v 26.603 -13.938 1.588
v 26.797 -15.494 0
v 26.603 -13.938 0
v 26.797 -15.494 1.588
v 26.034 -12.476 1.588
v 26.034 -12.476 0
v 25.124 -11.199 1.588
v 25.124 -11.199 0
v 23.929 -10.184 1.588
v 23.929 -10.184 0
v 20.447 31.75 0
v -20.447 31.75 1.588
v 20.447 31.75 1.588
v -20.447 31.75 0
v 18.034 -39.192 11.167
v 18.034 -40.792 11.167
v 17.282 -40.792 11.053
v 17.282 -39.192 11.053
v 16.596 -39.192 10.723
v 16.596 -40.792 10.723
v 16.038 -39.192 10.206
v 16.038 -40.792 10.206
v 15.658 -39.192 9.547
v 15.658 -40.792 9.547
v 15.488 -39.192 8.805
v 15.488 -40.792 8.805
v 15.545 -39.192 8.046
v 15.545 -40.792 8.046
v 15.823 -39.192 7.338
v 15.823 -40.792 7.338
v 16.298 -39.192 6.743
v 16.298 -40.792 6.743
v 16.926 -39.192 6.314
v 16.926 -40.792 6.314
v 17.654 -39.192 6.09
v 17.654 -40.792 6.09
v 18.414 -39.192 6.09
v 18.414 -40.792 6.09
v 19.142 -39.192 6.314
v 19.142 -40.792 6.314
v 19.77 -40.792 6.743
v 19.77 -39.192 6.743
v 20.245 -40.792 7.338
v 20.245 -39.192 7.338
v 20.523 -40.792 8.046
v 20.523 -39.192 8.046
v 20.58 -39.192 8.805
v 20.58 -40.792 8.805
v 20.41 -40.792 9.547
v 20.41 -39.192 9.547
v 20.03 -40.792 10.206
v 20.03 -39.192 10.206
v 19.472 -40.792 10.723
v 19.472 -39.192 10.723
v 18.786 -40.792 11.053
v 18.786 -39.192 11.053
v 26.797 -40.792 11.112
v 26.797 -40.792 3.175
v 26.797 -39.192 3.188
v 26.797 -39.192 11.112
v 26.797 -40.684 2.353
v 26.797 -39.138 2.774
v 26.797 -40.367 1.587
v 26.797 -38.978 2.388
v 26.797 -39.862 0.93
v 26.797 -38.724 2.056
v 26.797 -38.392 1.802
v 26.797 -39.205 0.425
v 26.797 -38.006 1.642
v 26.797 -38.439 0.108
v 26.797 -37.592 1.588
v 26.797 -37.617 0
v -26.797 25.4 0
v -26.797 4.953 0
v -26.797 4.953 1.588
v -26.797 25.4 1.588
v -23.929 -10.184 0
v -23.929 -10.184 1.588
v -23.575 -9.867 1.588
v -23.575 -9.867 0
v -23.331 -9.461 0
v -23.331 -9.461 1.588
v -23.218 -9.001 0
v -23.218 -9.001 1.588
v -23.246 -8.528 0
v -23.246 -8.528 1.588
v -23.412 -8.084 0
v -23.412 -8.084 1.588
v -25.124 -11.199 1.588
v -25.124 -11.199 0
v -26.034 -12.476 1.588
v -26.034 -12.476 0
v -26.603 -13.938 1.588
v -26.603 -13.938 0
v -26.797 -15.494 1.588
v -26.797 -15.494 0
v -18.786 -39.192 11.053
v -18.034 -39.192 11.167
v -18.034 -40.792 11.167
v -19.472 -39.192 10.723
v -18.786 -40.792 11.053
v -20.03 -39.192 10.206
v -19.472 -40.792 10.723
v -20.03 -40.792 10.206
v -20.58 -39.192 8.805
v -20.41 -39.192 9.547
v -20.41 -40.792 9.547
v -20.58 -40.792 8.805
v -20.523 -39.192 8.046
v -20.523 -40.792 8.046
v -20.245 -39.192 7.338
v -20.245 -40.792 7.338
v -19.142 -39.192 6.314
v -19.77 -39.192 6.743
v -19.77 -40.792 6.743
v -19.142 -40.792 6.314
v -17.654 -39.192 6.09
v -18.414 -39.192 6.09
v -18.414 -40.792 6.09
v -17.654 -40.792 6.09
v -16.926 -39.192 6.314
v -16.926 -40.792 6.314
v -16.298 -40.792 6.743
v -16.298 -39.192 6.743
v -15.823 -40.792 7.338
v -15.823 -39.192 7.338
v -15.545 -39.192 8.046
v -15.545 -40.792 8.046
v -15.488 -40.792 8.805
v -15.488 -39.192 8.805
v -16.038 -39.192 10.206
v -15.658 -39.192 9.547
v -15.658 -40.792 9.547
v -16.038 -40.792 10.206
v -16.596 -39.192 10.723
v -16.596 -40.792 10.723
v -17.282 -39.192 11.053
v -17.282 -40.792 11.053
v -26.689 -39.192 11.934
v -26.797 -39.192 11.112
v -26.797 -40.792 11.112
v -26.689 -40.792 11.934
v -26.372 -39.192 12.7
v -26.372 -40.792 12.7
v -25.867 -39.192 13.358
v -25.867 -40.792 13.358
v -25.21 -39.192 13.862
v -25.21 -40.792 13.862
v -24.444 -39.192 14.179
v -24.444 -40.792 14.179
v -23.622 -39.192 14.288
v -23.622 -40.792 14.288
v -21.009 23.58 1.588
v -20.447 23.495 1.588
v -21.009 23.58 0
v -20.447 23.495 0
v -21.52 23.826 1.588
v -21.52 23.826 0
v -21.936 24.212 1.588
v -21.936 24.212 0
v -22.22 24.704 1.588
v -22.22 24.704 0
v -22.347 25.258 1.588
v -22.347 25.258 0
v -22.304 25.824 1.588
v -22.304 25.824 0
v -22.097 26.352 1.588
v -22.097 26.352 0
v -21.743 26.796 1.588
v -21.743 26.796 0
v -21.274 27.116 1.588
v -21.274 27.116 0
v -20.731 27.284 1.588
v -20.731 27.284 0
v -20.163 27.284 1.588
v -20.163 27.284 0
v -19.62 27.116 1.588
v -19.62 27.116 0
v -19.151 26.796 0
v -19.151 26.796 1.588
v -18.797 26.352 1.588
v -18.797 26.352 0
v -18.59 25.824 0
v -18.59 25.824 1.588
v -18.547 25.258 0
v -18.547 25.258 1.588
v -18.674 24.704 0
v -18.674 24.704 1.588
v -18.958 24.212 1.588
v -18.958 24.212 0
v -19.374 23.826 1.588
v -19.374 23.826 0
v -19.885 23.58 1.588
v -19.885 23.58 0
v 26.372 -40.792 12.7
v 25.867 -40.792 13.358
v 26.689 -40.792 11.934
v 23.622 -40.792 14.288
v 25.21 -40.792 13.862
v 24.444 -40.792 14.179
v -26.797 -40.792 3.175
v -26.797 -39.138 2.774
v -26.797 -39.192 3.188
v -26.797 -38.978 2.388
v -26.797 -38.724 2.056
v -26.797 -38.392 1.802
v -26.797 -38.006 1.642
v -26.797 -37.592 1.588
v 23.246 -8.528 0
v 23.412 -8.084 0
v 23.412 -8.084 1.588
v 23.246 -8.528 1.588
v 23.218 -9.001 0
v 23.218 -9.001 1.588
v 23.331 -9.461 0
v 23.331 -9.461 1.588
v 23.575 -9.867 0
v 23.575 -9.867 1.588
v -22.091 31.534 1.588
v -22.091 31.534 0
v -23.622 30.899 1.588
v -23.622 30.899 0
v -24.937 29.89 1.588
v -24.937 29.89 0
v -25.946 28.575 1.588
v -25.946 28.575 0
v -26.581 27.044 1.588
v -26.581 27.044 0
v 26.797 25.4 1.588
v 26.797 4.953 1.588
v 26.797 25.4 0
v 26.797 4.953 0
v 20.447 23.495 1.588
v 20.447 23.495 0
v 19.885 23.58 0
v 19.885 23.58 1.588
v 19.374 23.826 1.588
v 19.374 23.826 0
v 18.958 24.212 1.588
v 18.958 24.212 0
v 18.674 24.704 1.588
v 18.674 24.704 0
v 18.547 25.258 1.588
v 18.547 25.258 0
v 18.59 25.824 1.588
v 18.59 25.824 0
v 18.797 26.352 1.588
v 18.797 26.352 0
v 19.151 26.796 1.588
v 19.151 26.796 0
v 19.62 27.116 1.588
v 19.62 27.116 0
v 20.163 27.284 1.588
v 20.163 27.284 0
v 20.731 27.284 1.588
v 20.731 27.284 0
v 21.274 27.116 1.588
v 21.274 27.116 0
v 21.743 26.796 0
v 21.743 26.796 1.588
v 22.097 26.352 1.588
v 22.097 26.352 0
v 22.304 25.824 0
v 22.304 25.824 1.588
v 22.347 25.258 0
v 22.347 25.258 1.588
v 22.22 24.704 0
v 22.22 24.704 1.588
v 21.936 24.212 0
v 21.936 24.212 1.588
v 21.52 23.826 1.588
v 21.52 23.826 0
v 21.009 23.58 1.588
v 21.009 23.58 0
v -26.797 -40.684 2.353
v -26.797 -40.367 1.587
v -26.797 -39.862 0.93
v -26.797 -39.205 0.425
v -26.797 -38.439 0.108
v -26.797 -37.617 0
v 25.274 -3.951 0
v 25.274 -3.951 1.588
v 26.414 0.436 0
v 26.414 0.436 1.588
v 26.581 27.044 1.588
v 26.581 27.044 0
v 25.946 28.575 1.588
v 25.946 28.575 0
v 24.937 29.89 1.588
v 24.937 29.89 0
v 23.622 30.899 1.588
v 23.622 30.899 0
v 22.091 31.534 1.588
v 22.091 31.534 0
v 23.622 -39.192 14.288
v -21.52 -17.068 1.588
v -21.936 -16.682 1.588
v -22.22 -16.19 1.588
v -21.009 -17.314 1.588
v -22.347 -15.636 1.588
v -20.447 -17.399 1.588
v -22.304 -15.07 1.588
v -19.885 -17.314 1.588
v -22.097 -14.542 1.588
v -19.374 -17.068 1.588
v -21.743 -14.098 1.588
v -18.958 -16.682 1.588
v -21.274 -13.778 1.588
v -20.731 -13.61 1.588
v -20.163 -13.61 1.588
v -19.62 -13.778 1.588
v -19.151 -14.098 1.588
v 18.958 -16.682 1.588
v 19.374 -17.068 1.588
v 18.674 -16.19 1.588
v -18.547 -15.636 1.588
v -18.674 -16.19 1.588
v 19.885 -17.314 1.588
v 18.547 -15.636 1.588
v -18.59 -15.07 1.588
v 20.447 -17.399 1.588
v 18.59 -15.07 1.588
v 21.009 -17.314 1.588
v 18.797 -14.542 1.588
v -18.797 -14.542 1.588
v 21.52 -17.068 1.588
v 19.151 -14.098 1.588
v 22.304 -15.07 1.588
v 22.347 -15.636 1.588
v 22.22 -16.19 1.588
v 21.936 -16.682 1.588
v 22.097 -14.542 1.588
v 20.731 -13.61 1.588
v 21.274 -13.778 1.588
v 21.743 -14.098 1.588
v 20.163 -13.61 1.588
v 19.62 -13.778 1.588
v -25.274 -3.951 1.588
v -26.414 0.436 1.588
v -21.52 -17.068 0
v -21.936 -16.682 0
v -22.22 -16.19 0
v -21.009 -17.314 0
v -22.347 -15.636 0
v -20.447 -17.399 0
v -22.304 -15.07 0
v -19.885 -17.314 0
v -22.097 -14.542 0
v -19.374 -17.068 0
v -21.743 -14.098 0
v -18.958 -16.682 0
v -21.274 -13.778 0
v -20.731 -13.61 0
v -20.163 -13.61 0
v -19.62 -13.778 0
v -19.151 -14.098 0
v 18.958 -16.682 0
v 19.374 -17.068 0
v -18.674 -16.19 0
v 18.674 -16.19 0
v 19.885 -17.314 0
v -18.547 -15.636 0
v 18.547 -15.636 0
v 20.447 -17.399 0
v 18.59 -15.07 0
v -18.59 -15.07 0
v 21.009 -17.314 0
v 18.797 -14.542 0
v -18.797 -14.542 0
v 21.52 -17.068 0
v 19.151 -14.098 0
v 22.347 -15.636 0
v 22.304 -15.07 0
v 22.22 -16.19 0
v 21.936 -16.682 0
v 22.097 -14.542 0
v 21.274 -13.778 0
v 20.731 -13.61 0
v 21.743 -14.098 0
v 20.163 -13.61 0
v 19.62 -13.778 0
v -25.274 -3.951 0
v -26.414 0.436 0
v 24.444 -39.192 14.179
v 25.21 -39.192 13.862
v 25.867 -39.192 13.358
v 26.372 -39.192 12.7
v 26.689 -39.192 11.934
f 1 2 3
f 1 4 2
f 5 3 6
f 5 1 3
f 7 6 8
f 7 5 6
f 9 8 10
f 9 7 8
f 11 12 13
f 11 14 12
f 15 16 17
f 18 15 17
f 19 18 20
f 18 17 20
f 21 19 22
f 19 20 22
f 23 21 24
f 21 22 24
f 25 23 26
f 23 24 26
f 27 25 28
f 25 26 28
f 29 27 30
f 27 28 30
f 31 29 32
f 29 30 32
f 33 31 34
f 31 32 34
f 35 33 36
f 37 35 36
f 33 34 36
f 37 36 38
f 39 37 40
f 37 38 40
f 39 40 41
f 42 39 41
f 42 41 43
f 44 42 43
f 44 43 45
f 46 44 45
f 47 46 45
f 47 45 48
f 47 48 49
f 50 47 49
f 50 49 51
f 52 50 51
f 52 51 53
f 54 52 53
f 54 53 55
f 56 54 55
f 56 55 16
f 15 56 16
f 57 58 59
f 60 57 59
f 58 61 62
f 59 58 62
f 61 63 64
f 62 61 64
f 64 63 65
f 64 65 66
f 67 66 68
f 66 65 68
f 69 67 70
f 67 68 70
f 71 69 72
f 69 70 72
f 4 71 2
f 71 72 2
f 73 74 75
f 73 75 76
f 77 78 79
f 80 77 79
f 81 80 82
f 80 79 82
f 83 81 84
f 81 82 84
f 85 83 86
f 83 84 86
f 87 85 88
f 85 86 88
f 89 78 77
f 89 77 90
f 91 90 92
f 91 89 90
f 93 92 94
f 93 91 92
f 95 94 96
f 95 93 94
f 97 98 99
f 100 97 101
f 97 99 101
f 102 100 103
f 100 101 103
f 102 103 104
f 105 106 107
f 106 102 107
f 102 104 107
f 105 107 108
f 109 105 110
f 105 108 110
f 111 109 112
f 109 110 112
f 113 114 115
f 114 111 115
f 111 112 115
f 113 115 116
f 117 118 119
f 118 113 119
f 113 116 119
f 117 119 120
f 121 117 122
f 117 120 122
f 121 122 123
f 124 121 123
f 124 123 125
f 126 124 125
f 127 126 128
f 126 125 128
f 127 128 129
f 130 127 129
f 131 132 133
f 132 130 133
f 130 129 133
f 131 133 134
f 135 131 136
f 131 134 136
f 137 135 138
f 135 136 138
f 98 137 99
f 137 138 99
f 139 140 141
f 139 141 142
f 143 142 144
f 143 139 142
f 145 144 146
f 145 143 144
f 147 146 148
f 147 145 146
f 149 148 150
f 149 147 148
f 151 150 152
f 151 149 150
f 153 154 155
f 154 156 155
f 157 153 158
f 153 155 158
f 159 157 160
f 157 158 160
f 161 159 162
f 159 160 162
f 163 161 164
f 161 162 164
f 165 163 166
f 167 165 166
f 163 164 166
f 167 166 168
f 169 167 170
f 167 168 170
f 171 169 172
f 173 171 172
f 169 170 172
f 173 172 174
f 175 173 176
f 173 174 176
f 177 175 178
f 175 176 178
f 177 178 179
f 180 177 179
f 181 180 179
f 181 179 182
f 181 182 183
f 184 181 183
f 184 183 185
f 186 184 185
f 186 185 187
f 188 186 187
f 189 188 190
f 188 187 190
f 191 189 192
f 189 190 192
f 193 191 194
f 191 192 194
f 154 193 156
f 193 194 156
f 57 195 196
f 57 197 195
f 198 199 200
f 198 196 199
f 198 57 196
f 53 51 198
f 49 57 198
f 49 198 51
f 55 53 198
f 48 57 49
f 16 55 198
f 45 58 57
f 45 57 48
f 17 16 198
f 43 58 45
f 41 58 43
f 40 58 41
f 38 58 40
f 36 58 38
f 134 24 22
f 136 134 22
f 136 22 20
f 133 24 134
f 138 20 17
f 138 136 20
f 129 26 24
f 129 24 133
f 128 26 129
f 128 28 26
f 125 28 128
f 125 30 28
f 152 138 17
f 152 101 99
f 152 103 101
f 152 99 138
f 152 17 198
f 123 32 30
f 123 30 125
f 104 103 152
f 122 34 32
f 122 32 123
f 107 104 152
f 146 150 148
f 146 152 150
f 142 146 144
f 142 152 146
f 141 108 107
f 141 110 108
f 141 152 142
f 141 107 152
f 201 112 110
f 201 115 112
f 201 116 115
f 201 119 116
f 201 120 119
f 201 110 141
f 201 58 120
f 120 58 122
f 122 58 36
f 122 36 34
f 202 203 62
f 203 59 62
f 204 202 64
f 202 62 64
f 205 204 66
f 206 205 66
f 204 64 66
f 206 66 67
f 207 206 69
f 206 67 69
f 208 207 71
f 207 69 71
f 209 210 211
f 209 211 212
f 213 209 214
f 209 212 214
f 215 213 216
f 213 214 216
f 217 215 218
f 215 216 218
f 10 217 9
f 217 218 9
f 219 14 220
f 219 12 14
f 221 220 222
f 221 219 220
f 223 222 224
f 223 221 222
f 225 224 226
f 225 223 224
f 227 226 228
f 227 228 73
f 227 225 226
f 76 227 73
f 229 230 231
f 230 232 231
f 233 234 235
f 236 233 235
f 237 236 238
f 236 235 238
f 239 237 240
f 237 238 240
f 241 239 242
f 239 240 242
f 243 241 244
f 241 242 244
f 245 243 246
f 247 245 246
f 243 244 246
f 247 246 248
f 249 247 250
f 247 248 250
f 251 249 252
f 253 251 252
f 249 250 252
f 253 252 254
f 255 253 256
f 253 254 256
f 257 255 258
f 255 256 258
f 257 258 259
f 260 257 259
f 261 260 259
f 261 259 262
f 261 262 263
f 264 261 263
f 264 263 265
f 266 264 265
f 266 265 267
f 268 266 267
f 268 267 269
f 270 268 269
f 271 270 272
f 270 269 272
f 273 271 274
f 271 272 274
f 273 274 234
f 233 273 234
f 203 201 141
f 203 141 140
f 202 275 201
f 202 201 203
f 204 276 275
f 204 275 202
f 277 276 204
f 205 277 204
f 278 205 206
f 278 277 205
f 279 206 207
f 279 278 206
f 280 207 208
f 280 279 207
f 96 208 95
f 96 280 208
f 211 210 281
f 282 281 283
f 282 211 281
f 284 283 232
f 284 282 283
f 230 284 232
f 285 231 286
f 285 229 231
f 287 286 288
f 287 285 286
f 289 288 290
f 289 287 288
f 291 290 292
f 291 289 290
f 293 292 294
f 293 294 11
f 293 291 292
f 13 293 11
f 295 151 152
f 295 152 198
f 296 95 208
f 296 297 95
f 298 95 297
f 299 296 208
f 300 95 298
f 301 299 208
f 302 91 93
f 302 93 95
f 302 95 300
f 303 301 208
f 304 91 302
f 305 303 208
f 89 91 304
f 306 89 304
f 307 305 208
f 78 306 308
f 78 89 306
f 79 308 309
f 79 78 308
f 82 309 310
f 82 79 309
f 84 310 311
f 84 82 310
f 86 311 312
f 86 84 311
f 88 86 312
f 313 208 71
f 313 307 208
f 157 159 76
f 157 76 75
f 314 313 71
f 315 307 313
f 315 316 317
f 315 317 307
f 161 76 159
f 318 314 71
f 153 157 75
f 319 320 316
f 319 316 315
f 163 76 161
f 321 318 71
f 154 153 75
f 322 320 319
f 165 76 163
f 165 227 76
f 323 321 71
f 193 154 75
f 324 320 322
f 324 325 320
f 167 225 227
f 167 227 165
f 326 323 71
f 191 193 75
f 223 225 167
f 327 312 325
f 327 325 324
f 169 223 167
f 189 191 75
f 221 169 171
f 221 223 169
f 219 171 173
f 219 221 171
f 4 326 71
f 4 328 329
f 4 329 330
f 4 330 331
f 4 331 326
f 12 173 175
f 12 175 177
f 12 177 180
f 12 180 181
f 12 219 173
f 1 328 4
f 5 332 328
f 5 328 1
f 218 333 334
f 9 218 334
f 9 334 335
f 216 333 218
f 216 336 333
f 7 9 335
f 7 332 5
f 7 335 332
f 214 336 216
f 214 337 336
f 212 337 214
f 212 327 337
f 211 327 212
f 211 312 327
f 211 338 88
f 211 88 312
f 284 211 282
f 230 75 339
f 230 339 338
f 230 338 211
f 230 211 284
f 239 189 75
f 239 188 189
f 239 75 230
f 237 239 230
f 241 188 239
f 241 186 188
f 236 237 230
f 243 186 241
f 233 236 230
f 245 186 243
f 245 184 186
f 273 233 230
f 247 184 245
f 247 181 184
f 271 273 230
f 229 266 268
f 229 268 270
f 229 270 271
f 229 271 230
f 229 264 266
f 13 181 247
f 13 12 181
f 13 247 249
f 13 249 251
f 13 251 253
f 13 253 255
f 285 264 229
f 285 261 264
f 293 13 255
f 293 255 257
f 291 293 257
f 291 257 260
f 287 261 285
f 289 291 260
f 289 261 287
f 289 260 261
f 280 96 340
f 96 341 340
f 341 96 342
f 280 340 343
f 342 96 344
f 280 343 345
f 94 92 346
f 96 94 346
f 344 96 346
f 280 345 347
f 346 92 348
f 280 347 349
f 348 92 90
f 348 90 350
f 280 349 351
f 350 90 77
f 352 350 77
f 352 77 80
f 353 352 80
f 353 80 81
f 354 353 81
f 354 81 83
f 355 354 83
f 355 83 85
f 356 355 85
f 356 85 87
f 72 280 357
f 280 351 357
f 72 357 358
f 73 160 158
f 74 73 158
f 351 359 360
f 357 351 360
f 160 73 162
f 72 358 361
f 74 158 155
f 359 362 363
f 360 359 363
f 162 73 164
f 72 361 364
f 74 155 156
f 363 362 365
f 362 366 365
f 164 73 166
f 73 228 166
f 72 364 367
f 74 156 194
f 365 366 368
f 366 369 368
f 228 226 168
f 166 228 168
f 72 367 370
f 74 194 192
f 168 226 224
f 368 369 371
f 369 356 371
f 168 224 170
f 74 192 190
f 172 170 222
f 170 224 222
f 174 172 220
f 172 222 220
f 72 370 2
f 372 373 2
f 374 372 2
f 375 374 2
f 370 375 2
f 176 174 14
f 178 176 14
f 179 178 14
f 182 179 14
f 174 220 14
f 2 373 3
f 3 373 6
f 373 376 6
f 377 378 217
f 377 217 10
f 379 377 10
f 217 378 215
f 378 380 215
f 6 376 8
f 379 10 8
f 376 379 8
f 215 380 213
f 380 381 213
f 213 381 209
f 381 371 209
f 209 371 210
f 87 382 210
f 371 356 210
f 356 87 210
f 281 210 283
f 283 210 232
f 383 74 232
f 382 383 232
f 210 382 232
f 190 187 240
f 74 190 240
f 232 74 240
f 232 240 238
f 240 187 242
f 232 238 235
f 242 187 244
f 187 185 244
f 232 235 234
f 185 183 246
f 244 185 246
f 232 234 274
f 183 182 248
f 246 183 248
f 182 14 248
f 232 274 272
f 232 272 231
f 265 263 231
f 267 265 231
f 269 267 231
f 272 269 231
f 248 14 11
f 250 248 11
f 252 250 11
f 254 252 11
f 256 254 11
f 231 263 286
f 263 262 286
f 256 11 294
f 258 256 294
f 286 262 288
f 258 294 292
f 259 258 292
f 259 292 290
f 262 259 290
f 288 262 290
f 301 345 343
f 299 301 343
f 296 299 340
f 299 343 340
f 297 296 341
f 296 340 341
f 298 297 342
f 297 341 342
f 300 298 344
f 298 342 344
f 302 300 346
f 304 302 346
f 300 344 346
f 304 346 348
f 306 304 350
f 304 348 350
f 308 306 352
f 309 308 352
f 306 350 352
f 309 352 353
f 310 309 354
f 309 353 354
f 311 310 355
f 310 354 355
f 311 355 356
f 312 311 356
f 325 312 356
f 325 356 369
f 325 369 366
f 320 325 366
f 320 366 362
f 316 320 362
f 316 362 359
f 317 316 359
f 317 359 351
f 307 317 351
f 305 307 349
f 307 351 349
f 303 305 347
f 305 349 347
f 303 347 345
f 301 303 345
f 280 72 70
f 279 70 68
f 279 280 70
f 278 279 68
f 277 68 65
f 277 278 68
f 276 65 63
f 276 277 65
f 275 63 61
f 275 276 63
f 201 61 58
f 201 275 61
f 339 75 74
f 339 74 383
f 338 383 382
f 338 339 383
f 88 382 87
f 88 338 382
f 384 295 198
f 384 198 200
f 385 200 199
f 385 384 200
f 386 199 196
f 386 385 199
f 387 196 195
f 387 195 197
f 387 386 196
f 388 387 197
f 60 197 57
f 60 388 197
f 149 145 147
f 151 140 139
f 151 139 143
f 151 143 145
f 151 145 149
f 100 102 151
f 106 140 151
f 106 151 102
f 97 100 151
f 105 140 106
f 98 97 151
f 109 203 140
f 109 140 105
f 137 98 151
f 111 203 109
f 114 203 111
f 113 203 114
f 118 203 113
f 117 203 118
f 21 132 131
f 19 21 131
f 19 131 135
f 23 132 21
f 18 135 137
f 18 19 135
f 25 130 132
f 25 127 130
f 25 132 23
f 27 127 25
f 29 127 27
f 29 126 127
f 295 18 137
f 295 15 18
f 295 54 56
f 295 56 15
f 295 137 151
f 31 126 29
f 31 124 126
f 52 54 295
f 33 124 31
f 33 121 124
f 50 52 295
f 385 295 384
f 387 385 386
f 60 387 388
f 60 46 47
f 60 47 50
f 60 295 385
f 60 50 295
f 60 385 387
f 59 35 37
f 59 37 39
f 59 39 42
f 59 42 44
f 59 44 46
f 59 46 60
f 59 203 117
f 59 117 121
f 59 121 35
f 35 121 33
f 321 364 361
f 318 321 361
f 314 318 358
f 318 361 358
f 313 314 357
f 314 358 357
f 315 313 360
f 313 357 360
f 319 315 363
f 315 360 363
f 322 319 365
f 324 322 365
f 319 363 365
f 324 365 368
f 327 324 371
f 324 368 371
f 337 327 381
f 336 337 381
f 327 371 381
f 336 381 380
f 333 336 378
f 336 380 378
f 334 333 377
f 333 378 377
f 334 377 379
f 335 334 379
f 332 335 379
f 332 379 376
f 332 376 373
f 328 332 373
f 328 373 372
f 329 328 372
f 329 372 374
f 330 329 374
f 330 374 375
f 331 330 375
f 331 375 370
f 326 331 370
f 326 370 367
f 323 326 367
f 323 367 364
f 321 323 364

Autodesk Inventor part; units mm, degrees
ref_plane "XZ Plane" through (0, 0, 0) normal (0, 1, 0) x (-1, 0, 0)
ref_plane "XY Plane" through (0, 0, 0) normal (0, 0, 1) x (1, 0, 0)
sketch "Sketch1" plane through (0, 0, 0) normal (0, 0, 1) x (1, 0, 0)
  line L0 (-26.797, 31.75) -> (26.797, 31.75)
  line L1 (26.797, 31.75) -> (26.797, -31.75)
  line L2 (26.797, -31.75) -> (-26.797, -31.75)
  line L3 (-26.797, -31.75) -> (-26.797, 31.75)
  point P0 (0, 0)
  point P1 (-26.797, 0)
  point P2 (0, 31.75)
  dimension "d0" = 53.594
  dimension "d1" = 63.5
extrude "Extrusion1" add sketch "Sketch1" along normal blind 1.5875
sketch "Sketch9" plane through (0, 0, 1.5875) normal (0, 0, 1) x (1, 0, 0)
  line L0 (26.797, 31.75) -> (26.797, -31.75) projected
  line L1 (-26.797, -31.75) -> (-26.797, 31.75) projected
  line L2 (26.797, -31.75) -> (-26.797, -31.75) projected
  line L3 (-26.797, -31.75) -> (26.797, -31.75)
  line L4 (26.797, -31.75) -> (26.797, -40.7924)
  line L5 (26.797, -40.7924) -> (-26.797, -40.7924)
  line L6 (-26.797, -40.7924) -> (-26.797, -31.75)
  line L7 (-26.797, 31.75) -> (26.797, 31.75) projected
  point P0 (0, 0)
  dimension "d60" = 72.5424
extrude "Extrusion5" add sketch "Sketch9" against normal up to surface (1.5875 mm away) contours L4 L5 L6 L2
sketch "Sketch2" plane through (0, 0, 1.5875) normal (0, 0, 1) x (1, 0, 0)
  line L0 (-26.797, -39.1922) -> (26.797, -39.1922)
  line L1 (26.797, -40.7924) -> (-26.797, -40.7924)
  line L2 (26.797, -40.7924) -> (26.797, 31.75) projected
  line L3 (-26.797, -40.7924) -> (26.797, -40.7924) projected
  line L4 (-26.797, -40.7924) -> (-26.797, -39.1922)
  line L5 (26.797, -40.7924) -> (26.797, -39.1922)
  point P0 (-26.797, -31.75)
  point P1 (0, 0)
  dimension "d4" = 53.594
  dimension "d59" = 1.6002
extrude "Extrusion2" add sketch "Sketch2" along normal blind 12.7
sketch "Sketch6" plane through (0, 0, 1.5875) normal (0, 0, 1) x (1, 0, 0)
  line L0 (26.797, 31.75) -> (26.797, -29.3687) projected
  line L1 (-26.797, 31.75) -> (26.797, 31.75) projected
  line L2 (-26.797, -29.3687) -> (-26.797, 31.75) projected
  arc A0 (20.447, -21.844) -> (23.9286, -10.1836) centre (20.447, -15.494) ccw projected
  arc A1 (23.4121, -8.0836) -> (23.9286, -10.1836) centre (24.799, -8.856) ccw projected
  arc A2 (23.4121, -8.0836) -> (26.797, 4.953) centre (0, 4.953) ccw projected
  line L3 (26.797, 25.4) -> (26.797, 4.953) projected
  arc A3 (26.797, 25.4) -> (20.447, 31.75) centre (20.447, 25.4) ccw projected
  line L4 (14.199, 31.75) -> (20.447, 31.75) projected
  line L5 (-14.199, 31.75) -> (14.199, 31.75) projected
  line L6 (-20.447, 31.75) -> (-14.199, 31.75) projected
  arc A4 (-20.447, 31.75) -> (-26.797, 25.4) centre (-20.447, 25.4) ccw projected
  line L7 (-26.797, 4.953) -> (-26.797, 25.4) projected
  arc A5 (-26.797, 4.953) -> (-23.4121, -8.0836) centre (0, 4.953) ccw projected
  arc A6 (-23.9286, -10.1836) -> (-23.4121, -8.0836) centre (-24.799, -8.856) ccw projected
  arc A7 (-23.9286, -10.1836) -> (-20.447, -21.844) centre (-20.447, -15.494) ccw projected
  line L8 (20.447, -21.844) -> (-20.447, -21.844) projected
  arc A8 (-23.9286, -10.1836) -> (-26.797, -15.494) centre (-20.447, -15.494) ccw
  arc A9 (26.797, -15.494) -> (23.9286, -10.1836) centre (20.447, -15.494) ccw
  arc A10 (23.4121, -8.0836) -> (23.9286, -10.1836) centre (24.799, -8.856) ccw
  arc A11 (-23.9286, -10.1836) -> (-23.4121, -8.0836) centre (-24.799, -8.856) ccw
  point P0 (0, 0)
extrude "Extrusion4" cut sketch "Sketch6" against normal up to next contours L0 A3 L1 | L0 A0 A1 A2 | A4 L2 L1 | L2 A5 A6 A7
sketch "Sketch7" plane through (0, 0, 1.5875) normal (0, 0, 1) x (1, 0, 0)
  arc A0 (26.797, 25.4) -> (20.447, 31.75) centre (20.447, 25.4) ccw projected
  arc A1 (-20.447, 31.75) -> (-26.797, 25.4) centre (-20.447, 25.4) ccw projected
  arc A2 (-23.9286, -10.1836) -> (-26.797, -15.494) centre (-20.447, -15.494) ccw projected
  arc A3 (26.797, -15.494) -> (23.9286, -10.1836) centre (20.447, -15.494) ccw projected
  point P0 (0, 0)
hole "Hole3" at (-20.447, 25.4, 1.5875) at (20.447, 25.4, 1.5875) at (20.447, -15.494, 1.5875) at (-20.447, -15.494, 1.5875) direction (0, 0, -1) diameter 3.81 end through all clearance for "Oval Head Machine Screw" size "#6" standard "Ansi Unified Screw Threads"
ref_plane "Work Plane1" through (-26.797, -30.1625, 2.3812) normal (0, 1, 0) x (1, 0, 0)
fillet "Fillet3" radius 1.6002 1 edges at (0, -39.1922, 1.5875)
fillet "Fillet4" radius 3.175 1 edges at (0, -40.7924, 0)
fillet "Fillet5" radius 3.175 2 edges at (-26.797, -39.9923, 14.2875) (26.797, -39.9923, 14.2875)
sketch "Sketch10" plane through (-26.797, -39.1922, 3.1877) normal (0, 1, 0) x (1, 0, 0)
  circle A0 centre (44.831, -5.4264) radius 2.4116 projected
  point P0 (26.797, 3.1877)
hole "Hole6" at (18.034, -39.1922, 8.6141) direction (0, -1, 0) diameter 5.1054 end through all clearance for "Flat Head Machine Screw (82)" size "#10" standard "Ansi Unified Screw Threads"
mirror "Mirror1" about plane through (0, 0, 0) normal (1, 0, 0) of "Hole6"
properties part number "Pneumatics_VIAIR_0090_01" material "Aluminum-6061"
